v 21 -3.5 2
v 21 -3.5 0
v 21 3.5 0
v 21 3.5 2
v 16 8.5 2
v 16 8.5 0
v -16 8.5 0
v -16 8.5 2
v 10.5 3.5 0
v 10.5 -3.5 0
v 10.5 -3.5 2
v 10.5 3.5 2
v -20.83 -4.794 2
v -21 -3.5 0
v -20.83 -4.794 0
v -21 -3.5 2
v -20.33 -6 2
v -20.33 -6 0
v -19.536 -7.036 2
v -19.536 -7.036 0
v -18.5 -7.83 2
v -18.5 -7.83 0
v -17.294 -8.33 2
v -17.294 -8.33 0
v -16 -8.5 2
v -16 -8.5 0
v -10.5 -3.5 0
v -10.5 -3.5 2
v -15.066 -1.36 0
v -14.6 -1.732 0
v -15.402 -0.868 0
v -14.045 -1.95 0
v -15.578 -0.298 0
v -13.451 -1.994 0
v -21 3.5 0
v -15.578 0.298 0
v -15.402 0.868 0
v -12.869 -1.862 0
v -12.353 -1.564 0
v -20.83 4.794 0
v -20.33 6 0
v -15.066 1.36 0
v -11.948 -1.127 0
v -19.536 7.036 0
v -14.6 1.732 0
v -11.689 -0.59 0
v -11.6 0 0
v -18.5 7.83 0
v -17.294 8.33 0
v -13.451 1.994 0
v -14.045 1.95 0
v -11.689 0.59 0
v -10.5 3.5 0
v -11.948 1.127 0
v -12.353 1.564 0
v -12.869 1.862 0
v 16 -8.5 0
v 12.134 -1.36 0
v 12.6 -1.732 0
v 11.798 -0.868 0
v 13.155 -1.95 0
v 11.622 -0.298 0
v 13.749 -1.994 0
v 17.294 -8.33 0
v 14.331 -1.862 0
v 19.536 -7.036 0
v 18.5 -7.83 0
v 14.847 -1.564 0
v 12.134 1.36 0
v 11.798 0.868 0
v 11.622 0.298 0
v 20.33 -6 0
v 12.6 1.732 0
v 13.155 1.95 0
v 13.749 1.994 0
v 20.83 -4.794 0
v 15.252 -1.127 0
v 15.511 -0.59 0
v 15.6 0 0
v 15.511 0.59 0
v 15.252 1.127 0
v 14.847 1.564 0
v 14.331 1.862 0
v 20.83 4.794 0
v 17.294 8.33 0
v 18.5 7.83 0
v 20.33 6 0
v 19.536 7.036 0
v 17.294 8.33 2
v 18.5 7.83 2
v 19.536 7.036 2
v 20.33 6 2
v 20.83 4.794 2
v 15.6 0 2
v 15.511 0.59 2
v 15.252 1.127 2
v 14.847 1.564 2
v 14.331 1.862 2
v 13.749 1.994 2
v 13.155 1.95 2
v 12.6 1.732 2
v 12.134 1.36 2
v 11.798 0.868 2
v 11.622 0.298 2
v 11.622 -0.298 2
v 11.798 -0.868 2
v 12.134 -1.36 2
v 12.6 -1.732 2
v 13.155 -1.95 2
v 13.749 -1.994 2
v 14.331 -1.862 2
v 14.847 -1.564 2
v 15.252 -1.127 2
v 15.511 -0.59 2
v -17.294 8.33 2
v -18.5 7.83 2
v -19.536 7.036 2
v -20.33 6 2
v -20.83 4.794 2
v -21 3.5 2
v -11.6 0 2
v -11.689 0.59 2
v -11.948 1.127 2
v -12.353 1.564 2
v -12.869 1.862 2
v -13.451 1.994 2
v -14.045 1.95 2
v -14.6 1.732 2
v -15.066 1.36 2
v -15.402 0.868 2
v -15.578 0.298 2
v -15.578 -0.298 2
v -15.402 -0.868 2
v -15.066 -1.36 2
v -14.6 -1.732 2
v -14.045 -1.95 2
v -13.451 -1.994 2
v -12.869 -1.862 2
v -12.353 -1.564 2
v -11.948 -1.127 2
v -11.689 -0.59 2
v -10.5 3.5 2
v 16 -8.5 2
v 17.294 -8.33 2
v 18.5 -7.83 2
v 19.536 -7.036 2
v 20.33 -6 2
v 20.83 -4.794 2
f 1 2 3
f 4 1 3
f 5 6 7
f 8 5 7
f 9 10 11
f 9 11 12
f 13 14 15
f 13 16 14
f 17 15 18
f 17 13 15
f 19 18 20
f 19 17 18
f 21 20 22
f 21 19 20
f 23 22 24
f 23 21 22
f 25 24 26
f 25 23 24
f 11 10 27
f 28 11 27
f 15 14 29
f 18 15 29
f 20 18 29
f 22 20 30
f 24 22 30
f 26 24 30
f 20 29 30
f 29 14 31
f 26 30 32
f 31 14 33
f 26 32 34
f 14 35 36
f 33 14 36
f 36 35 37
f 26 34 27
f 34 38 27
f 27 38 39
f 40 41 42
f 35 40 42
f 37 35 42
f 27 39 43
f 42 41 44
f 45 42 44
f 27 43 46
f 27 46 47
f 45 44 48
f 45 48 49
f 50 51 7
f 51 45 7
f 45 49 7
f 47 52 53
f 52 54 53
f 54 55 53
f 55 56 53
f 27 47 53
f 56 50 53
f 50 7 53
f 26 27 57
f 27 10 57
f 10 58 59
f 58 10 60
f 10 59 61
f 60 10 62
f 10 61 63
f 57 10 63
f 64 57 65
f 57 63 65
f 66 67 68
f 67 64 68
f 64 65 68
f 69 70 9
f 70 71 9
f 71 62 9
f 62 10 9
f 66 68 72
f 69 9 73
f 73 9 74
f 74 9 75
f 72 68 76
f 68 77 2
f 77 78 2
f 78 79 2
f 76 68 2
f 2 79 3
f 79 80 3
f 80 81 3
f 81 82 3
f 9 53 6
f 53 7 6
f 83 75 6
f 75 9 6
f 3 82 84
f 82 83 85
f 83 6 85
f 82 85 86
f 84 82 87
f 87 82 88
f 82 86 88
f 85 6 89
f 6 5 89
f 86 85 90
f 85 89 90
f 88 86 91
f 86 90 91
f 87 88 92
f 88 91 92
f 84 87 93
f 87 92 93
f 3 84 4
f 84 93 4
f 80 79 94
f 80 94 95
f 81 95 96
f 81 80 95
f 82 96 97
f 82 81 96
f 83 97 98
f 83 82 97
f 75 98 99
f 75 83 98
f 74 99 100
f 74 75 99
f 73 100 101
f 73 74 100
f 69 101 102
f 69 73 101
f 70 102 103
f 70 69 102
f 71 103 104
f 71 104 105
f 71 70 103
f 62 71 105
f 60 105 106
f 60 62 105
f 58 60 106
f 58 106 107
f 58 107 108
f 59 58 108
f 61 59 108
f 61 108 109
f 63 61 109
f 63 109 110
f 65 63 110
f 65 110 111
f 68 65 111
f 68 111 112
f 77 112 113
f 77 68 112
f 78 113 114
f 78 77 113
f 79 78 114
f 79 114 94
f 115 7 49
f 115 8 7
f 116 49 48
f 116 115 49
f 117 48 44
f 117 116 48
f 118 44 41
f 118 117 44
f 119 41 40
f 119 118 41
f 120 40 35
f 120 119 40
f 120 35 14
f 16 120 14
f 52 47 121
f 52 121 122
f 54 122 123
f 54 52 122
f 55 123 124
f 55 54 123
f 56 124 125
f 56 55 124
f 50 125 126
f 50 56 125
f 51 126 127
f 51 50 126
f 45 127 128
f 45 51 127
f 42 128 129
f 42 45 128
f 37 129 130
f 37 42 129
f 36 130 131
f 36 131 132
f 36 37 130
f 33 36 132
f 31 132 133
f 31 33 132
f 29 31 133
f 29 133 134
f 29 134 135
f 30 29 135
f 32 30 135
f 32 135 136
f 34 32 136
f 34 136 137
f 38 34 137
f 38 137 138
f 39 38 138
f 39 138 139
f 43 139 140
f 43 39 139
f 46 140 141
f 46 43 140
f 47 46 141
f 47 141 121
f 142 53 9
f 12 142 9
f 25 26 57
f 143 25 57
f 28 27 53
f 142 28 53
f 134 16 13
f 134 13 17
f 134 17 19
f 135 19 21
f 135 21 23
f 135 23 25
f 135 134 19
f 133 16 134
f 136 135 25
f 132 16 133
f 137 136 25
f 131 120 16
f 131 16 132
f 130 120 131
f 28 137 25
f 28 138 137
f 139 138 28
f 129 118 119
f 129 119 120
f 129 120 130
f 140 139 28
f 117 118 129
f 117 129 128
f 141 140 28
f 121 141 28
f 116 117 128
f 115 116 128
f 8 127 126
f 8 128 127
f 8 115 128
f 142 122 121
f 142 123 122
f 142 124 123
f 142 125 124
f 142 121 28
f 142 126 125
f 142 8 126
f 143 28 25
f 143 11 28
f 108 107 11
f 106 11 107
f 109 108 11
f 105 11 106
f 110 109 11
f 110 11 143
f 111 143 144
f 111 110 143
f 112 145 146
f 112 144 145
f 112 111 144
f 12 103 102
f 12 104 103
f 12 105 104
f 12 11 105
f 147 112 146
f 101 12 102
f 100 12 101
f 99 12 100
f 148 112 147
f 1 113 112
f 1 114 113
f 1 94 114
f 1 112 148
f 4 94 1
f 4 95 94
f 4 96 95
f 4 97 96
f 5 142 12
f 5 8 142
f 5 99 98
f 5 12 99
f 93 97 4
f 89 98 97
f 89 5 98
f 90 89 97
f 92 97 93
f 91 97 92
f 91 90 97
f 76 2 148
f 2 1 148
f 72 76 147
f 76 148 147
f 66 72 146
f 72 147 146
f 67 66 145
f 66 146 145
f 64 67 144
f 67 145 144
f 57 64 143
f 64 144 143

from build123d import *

# Parameters (mm, degrees)
F0_W     = 5.5
F0_H     = 7
F0_R     = 2
F1_DEPTH = 2
F2_R     = 5


with BuildPart() as f1:
    # F0 (on Top) → F1 (new body)
    with BuildSketch(Plane.XY):
        Polygon((21, 8.5), (10.5, 8.5), (-10.5, 8.5), (-21, 8.5), (-21, -8.5), (-10.5, -8.5), (10.5, -8.5), (21, -8.5), align=None)
        Polygon((16, -3.5), (10.5, -3.5), (-10.5, -3.5), (-16, -3.5), (-16, 3.5), (-10.5, 3.5), (10.5, 3.5), (16, 3.5), align=None, mode=Mode.SUBTRACT)
        with Locations((-13.25, 0)):
            Rectangle(F0_W, F0_H)
        with Locations((-13.6, 0)):
            Circle(F0_R, mode=Mode.SUBTRACT)
        with Locations((13.25, 0)):
            Rectangle(F0_W, F0_H)
        with Locations((13.6, 0)):
            Circle(F0_R, mode=Mode.SUBTRACT)
    extrude(amount=F1_DEPTH)

    # F2
    f2_edges = [f1.edges().sort_by_distance(p)[0] for p in [
        (-21, 8.5, 1),
        (-21, -8.5, 1),
        (21, -8.5, 1),
        (21, 8.5, 1),
    ]]
    fillet(f2_edges, radius=F2_R)


solid = f1.part
